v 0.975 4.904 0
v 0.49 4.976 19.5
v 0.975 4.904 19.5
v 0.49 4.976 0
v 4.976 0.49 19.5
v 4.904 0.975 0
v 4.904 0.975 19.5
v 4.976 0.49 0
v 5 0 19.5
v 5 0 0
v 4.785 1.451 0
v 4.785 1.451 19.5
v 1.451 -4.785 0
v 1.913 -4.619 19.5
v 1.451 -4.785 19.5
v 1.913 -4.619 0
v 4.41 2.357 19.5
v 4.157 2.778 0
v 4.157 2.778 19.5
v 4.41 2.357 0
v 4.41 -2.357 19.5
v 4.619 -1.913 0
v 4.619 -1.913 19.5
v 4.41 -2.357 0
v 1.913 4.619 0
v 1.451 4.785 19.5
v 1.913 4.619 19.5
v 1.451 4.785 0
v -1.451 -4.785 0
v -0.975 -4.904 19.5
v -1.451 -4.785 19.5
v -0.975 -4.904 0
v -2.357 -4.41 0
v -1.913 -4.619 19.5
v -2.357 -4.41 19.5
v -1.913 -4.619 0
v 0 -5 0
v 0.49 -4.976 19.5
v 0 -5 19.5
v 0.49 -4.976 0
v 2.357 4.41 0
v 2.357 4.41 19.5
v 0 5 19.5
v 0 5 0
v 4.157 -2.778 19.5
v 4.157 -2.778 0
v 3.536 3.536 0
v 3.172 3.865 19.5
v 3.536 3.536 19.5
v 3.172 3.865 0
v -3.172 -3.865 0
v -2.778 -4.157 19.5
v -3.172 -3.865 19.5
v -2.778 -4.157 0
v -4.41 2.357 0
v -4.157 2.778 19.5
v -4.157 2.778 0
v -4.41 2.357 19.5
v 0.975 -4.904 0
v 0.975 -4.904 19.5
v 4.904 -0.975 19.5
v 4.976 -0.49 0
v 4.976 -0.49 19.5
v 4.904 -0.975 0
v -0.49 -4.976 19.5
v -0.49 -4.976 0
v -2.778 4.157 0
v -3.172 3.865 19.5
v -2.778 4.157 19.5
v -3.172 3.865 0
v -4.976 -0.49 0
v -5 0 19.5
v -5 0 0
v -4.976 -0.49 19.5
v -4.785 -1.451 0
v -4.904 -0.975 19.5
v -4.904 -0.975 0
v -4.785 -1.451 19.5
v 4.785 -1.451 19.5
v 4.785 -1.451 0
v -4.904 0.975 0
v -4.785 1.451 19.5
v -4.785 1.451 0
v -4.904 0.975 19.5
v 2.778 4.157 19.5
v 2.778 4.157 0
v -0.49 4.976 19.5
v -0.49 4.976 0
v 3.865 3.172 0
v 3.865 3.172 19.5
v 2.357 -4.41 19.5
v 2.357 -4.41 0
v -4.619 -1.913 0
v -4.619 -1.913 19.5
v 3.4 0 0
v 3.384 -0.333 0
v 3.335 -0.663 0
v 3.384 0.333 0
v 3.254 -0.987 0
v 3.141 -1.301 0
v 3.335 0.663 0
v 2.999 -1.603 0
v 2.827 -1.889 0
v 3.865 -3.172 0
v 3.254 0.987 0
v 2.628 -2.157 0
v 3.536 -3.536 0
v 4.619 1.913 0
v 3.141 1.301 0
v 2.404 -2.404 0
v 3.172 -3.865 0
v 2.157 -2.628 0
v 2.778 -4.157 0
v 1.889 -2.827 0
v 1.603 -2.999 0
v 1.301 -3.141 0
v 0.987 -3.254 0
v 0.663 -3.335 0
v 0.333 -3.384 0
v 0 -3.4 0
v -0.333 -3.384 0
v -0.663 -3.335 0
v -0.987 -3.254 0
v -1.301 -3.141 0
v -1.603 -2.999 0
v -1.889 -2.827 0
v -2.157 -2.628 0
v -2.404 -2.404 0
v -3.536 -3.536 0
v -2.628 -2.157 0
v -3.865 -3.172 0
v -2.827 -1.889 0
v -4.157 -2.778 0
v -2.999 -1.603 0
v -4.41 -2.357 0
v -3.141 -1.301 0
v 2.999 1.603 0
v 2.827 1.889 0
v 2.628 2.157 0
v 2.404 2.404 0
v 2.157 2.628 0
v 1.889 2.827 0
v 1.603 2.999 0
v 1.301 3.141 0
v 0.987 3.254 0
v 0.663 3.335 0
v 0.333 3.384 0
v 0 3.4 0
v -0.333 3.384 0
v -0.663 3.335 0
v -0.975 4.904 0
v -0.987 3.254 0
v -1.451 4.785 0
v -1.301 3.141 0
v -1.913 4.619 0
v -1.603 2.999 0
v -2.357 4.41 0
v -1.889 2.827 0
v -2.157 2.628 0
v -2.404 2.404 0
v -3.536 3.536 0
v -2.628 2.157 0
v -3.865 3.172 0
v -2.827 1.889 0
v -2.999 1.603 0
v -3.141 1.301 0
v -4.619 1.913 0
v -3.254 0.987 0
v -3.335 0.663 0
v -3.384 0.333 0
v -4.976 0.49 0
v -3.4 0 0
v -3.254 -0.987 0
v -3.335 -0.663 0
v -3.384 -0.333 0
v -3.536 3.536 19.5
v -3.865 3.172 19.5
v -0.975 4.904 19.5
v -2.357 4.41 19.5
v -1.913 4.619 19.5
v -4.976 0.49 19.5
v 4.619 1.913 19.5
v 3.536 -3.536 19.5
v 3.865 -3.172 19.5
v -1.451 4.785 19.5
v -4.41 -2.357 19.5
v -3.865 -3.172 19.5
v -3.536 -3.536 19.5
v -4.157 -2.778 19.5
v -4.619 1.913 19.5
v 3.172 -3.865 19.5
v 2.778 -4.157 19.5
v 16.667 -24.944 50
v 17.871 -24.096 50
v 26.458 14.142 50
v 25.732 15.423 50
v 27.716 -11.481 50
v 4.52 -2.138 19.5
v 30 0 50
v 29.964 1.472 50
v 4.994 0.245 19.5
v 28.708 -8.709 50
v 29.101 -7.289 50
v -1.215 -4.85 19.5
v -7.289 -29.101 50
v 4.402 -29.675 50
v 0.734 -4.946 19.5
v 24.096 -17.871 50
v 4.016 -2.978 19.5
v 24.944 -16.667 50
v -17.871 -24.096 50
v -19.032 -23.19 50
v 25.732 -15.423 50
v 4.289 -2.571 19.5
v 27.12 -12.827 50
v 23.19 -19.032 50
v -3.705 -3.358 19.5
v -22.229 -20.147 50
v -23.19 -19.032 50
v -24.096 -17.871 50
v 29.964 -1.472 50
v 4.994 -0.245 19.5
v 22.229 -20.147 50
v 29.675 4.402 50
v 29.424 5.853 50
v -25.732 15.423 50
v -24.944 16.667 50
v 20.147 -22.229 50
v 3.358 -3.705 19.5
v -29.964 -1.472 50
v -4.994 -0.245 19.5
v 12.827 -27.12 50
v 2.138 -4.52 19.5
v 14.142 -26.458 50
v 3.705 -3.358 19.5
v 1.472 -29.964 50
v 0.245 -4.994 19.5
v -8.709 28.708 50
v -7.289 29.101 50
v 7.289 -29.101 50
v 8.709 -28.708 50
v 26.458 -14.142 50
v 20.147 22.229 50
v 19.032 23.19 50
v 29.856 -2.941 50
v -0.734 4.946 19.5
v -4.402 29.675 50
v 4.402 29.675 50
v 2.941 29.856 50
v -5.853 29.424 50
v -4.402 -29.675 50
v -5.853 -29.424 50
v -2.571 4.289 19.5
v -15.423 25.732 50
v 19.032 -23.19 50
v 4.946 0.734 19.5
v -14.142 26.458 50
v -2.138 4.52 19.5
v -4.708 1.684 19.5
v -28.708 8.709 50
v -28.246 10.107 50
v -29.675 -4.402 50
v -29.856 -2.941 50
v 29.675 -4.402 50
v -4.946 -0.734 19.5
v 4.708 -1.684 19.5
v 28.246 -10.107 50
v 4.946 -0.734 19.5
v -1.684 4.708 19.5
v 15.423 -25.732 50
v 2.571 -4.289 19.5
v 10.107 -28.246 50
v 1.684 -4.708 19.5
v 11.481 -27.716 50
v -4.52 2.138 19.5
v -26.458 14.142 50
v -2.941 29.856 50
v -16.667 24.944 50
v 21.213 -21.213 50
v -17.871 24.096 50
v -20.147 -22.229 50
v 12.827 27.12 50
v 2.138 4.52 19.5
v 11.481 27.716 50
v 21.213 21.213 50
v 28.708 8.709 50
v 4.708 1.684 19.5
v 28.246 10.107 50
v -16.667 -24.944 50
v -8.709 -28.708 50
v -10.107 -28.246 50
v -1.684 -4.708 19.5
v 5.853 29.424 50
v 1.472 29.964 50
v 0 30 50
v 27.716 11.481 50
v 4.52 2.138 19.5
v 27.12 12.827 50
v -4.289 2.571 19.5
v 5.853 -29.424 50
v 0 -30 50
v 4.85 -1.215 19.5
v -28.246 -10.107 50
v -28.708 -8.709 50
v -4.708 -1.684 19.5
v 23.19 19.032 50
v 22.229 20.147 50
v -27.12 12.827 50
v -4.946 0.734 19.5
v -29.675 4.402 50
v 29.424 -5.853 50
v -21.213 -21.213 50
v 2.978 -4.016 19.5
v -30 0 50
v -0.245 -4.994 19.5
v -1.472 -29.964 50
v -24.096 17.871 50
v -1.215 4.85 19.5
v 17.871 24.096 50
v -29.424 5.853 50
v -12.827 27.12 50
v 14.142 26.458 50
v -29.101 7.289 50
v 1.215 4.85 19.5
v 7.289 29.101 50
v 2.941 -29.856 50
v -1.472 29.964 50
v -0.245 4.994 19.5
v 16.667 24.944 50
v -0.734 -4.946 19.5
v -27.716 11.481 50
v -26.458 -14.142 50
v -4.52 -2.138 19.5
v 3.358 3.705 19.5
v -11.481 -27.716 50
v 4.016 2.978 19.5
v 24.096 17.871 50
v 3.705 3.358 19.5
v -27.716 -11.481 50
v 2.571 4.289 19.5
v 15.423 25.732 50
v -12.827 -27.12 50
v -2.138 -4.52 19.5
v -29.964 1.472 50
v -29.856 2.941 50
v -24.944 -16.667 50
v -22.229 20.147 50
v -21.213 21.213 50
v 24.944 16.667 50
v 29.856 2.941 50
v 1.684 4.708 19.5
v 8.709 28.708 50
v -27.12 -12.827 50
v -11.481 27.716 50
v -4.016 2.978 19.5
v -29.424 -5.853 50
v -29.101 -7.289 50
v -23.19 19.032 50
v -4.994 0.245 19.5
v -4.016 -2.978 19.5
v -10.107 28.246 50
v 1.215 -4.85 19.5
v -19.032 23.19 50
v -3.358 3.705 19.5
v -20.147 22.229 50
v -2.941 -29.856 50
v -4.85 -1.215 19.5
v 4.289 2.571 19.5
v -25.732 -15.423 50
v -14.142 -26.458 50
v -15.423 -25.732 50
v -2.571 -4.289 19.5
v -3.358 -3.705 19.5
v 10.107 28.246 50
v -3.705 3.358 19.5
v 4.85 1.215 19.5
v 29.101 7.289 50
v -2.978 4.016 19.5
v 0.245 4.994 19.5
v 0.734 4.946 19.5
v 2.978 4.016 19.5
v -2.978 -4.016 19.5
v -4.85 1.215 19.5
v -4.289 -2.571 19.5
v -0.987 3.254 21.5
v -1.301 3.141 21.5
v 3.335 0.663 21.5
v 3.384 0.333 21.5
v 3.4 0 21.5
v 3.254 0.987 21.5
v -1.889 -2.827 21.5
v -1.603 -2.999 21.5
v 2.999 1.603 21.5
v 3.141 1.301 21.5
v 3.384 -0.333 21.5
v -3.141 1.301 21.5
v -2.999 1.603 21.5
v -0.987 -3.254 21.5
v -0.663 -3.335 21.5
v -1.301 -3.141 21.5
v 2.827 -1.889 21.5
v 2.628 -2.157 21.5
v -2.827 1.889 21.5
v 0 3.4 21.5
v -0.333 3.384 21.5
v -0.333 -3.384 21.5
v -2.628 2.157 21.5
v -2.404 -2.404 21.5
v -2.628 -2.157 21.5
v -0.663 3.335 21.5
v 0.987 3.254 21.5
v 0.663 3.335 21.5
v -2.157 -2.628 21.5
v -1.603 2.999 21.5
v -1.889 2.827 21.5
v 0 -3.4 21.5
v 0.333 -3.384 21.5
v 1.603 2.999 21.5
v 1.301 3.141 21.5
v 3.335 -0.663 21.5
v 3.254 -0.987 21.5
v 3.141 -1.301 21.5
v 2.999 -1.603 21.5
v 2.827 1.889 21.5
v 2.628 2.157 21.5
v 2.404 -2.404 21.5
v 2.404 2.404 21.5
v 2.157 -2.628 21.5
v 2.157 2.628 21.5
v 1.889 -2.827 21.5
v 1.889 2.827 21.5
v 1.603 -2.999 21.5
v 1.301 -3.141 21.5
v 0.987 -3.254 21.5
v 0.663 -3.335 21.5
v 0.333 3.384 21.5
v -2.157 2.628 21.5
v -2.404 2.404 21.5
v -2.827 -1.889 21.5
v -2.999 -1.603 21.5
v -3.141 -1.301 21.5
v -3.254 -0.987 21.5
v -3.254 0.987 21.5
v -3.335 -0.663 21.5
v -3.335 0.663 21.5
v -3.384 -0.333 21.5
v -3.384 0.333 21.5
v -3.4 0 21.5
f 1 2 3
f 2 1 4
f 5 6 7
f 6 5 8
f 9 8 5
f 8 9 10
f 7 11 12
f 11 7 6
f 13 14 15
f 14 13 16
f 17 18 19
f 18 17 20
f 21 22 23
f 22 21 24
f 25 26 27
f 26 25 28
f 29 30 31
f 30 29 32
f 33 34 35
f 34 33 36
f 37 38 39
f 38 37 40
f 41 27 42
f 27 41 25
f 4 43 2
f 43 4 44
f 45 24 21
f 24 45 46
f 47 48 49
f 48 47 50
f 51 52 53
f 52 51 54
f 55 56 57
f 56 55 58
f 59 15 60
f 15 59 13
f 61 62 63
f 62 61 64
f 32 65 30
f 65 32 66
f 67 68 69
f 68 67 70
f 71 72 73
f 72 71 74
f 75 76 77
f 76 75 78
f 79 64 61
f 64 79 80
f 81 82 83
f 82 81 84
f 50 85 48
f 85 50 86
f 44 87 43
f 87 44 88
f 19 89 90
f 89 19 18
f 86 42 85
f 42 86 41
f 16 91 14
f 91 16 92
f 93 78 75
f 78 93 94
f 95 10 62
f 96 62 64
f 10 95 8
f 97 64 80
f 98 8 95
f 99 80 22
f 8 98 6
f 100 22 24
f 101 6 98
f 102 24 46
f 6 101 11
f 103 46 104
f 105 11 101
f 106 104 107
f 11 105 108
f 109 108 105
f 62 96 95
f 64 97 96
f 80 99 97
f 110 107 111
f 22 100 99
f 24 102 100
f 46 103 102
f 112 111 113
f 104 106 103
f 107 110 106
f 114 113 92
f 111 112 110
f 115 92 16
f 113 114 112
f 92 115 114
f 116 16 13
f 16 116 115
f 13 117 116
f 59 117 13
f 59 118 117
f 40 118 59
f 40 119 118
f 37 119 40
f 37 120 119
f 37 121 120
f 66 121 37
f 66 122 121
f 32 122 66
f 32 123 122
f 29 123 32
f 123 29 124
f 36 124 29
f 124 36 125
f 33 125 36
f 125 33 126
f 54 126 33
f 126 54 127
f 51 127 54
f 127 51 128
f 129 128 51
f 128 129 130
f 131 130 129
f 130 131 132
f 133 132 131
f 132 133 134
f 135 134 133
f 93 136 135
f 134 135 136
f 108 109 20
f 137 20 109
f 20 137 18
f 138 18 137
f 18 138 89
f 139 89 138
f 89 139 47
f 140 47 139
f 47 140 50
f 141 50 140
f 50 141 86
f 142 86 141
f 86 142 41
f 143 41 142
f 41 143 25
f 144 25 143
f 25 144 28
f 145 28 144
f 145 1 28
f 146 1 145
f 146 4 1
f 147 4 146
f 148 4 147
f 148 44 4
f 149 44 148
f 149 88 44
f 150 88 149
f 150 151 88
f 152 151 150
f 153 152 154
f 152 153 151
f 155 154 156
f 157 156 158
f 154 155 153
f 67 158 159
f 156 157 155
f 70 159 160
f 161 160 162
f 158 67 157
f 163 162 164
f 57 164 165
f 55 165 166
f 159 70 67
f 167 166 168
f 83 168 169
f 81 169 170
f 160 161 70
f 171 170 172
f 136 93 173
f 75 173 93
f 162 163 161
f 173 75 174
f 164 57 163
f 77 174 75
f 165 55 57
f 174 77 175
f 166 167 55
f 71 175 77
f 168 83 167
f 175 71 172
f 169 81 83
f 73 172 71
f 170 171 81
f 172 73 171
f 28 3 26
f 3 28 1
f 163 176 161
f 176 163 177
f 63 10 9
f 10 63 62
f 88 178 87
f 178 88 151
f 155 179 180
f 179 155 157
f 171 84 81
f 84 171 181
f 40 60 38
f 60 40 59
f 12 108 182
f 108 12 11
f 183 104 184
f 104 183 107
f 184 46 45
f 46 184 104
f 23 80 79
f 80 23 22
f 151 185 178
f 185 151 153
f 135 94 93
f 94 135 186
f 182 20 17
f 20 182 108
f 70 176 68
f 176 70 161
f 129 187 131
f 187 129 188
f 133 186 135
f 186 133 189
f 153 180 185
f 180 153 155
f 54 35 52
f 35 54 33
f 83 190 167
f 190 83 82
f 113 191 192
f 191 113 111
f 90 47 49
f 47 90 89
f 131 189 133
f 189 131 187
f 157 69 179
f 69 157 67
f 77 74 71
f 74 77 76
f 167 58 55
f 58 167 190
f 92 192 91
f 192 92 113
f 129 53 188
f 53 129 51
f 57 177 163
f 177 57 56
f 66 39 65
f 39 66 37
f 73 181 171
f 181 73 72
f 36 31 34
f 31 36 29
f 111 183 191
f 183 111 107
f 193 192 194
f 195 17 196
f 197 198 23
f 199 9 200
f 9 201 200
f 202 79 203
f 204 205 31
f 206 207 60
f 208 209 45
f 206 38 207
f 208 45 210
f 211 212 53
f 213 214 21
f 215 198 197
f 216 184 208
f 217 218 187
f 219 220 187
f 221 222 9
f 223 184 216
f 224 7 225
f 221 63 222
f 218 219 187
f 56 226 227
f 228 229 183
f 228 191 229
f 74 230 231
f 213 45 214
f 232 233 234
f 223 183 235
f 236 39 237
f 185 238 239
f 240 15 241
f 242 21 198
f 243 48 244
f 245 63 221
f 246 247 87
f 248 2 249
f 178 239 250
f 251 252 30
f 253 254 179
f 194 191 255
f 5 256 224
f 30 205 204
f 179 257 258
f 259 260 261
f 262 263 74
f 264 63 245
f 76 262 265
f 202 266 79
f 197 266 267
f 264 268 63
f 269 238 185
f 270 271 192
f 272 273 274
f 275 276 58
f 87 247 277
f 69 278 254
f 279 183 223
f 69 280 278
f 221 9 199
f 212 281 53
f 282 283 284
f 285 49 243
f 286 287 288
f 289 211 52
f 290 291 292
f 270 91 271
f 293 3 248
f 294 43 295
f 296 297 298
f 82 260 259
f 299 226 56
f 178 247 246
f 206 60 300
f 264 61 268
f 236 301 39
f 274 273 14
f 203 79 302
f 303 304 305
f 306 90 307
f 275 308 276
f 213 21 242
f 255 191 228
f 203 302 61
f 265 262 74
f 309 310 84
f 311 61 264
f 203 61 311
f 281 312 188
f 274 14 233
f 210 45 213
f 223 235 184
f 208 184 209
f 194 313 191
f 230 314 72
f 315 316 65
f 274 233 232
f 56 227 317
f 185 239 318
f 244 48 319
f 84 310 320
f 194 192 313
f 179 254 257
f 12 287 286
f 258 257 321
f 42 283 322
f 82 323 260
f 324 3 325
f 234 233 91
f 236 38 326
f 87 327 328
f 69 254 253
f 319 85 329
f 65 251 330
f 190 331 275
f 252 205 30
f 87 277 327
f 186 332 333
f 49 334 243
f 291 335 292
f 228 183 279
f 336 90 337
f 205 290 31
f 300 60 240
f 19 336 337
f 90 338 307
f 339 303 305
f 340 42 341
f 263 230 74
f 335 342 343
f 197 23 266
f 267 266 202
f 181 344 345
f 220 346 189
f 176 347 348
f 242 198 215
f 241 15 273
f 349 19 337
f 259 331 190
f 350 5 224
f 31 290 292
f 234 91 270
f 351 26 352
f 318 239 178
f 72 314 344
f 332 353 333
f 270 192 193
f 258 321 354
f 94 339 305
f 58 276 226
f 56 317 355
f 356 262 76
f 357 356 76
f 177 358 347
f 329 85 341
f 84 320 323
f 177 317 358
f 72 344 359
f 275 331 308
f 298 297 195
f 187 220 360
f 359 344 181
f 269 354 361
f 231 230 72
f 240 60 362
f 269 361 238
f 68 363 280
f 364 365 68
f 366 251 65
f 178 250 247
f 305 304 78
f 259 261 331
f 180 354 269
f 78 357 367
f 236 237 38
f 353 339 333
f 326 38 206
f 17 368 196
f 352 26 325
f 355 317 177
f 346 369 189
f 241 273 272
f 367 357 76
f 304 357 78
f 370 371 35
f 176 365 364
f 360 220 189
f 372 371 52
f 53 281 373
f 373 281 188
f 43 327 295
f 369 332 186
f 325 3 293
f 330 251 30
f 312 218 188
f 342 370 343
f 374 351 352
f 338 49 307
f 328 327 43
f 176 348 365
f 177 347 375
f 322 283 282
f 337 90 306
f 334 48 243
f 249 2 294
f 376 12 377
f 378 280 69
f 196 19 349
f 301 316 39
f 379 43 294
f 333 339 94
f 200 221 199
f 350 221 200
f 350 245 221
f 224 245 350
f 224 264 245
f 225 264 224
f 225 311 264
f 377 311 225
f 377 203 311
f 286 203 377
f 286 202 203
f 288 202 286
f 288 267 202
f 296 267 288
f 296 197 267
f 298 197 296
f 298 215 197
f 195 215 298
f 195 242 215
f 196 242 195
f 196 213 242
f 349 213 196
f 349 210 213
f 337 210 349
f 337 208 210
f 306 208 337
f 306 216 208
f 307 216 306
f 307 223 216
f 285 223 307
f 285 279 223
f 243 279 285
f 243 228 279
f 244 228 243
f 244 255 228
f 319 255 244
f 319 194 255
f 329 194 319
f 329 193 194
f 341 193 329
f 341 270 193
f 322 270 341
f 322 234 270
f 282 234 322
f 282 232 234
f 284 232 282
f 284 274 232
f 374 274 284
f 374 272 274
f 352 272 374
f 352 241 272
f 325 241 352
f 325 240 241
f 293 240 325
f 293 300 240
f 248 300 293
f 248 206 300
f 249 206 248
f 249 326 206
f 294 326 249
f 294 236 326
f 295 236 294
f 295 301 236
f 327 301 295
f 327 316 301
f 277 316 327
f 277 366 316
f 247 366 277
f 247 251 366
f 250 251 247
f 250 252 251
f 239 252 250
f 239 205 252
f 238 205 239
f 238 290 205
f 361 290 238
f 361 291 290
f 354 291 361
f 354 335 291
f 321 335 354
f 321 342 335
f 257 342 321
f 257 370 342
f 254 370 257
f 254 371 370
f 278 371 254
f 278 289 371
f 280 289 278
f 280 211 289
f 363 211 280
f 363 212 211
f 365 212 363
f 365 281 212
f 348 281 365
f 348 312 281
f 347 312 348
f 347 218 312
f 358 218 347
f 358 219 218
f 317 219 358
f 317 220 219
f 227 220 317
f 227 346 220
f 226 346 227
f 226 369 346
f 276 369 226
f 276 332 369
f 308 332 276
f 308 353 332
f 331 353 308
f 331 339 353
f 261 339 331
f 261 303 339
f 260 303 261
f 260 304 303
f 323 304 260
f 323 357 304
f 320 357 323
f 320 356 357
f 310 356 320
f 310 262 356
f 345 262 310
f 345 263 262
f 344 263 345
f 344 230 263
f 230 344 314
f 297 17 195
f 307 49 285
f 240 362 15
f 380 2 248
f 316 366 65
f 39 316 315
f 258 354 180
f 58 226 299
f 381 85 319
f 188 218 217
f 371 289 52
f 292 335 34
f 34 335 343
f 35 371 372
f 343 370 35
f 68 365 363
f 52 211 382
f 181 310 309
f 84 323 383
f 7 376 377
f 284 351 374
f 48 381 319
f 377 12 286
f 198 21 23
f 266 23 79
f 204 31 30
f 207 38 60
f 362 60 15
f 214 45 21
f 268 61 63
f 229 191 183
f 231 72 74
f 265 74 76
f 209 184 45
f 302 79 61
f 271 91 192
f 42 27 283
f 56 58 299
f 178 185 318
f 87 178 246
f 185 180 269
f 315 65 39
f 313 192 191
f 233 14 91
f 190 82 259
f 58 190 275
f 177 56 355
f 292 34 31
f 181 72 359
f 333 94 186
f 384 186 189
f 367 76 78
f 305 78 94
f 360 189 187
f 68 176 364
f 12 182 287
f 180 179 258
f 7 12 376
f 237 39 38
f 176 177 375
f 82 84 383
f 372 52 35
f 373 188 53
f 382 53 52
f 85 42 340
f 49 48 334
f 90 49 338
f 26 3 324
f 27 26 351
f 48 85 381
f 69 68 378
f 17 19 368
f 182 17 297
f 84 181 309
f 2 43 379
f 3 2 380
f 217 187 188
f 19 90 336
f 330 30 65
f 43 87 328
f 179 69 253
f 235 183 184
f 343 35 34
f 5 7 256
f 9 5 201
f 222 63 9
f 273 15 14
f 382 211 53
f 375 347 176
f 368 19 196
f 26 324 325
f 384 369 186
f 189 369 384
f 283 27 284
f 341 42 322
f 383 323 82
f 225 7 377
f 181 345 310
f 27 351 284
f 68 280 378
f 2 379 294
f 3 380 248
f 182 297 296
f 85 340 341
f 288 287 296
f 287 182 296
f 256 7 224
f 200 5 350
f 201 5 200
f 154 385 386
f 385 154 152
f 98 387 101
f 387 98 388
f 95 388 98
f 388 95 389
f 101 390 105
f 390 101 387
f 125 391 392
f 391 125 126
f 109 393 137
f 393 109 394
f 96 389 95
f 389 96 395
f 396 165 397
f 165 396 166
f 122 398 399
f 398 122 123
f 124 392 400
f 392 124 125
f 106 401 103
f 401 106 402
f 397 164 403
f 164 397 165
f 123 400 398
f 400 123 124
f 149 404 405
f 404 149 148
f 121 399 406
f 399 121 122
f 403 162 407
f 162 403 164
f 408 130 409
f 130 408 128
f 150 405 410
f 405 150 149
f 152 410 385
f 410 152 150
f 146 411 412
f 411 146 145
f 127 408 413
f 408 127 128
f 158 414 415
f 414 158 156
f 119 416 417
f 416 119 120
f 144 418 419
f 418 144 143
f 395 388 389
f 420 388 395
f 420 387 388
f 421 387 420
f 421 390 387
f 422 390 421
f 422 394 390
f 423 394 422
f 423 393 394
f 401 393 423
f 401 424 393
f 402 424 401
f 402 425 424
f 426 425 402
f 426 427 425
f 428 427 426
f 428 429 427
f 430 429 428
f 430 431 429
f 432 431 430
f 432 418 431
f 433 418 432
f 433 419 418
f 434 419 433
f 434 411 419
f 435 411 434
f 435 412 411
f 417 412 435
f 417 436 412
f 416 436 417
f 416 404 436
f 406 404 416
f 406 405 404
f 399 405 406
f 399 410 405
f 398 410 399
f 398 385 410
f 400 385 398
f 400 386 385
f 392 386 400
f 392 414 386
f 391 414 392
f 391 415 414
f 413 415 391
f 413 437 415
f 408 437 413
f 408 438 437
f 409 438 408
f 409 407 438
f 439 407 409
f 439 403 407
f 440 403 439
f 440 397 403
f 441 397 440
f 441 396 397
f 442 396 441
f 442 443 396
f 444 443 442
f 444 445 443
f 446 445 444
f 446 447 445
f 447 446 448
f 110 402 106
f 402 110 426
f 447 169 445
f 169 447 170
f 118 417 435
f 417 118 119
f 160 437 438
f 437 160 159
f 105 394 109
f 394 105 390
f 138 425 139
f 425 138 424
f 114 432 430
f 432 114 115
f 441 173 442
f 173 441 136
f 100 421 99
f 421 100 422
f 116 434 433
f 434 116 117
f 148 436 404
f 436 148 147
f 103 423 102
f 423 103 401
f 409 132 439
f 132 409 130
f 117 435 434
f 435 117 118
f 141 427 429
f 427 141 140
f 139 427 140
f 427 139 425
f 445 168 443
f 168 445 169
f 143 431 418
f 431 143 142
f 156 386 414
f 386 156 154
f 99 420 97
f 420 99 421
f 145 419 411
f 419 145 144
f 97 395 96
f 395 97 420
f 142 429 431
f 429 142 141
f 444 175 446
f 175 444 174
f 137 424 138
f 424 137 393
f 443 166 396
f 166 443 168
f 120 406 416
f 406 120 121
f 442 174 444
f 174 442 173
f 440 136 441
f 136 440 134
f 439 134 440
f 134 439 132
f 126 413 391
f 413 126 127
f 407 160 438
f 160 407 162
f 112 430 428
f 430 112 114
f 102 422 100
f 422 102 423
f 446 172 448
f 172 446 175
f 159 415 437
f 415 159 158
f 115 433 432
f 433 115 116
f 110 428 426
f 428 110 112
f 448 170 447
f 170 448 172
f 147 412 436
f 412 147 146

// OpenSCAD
// Small lab funnel, printed upright with the wide opening at the top
// All dimensions in millimetres

$fn = 64;

// ---- Parameters ----
spout_od        = 10;    // outer diameter of the straight spout
spout_h         = 20;    // spout height (z = 0 to z = 20)
spout_wall      = 1.6;   // wall thickness of the spout (bore = 6.8 mm)

cone_bottom_od  = 10;    // cone outer diameter at its base (z = 20)
cone_top_od     = 60;    // cone outer diameter at the rim (z = 50)
cone_rim_h      = 50;    // funnel rim height

overlap         = 0.5;   // overlap of the spout into the cone for a clean union

// ---- Model ----
difference() {
    union() {
        // Straight spout, open at both ends
        translate([0, 0, 0])
            cylinder(h = spout_h + overlap, d = spout_od, $fn = 64);

        // Cone widening from the spout base up to the rim
        translate([0, 0, spout_h - overlap])
            cylinder(h = cone_rim_h - spout_h + overlap,
                     d1 = cone_bottom_od,
                     d2 = cone_top_od,
                     $fn = 128);
    }

    // Through bore in the spout (extends past both faces)
    translate([0, 0, -1])
        cylinder(h = spout_h + overlap + 2, d = spout_od - 2 * spout_wall, $fn = 64);
}
